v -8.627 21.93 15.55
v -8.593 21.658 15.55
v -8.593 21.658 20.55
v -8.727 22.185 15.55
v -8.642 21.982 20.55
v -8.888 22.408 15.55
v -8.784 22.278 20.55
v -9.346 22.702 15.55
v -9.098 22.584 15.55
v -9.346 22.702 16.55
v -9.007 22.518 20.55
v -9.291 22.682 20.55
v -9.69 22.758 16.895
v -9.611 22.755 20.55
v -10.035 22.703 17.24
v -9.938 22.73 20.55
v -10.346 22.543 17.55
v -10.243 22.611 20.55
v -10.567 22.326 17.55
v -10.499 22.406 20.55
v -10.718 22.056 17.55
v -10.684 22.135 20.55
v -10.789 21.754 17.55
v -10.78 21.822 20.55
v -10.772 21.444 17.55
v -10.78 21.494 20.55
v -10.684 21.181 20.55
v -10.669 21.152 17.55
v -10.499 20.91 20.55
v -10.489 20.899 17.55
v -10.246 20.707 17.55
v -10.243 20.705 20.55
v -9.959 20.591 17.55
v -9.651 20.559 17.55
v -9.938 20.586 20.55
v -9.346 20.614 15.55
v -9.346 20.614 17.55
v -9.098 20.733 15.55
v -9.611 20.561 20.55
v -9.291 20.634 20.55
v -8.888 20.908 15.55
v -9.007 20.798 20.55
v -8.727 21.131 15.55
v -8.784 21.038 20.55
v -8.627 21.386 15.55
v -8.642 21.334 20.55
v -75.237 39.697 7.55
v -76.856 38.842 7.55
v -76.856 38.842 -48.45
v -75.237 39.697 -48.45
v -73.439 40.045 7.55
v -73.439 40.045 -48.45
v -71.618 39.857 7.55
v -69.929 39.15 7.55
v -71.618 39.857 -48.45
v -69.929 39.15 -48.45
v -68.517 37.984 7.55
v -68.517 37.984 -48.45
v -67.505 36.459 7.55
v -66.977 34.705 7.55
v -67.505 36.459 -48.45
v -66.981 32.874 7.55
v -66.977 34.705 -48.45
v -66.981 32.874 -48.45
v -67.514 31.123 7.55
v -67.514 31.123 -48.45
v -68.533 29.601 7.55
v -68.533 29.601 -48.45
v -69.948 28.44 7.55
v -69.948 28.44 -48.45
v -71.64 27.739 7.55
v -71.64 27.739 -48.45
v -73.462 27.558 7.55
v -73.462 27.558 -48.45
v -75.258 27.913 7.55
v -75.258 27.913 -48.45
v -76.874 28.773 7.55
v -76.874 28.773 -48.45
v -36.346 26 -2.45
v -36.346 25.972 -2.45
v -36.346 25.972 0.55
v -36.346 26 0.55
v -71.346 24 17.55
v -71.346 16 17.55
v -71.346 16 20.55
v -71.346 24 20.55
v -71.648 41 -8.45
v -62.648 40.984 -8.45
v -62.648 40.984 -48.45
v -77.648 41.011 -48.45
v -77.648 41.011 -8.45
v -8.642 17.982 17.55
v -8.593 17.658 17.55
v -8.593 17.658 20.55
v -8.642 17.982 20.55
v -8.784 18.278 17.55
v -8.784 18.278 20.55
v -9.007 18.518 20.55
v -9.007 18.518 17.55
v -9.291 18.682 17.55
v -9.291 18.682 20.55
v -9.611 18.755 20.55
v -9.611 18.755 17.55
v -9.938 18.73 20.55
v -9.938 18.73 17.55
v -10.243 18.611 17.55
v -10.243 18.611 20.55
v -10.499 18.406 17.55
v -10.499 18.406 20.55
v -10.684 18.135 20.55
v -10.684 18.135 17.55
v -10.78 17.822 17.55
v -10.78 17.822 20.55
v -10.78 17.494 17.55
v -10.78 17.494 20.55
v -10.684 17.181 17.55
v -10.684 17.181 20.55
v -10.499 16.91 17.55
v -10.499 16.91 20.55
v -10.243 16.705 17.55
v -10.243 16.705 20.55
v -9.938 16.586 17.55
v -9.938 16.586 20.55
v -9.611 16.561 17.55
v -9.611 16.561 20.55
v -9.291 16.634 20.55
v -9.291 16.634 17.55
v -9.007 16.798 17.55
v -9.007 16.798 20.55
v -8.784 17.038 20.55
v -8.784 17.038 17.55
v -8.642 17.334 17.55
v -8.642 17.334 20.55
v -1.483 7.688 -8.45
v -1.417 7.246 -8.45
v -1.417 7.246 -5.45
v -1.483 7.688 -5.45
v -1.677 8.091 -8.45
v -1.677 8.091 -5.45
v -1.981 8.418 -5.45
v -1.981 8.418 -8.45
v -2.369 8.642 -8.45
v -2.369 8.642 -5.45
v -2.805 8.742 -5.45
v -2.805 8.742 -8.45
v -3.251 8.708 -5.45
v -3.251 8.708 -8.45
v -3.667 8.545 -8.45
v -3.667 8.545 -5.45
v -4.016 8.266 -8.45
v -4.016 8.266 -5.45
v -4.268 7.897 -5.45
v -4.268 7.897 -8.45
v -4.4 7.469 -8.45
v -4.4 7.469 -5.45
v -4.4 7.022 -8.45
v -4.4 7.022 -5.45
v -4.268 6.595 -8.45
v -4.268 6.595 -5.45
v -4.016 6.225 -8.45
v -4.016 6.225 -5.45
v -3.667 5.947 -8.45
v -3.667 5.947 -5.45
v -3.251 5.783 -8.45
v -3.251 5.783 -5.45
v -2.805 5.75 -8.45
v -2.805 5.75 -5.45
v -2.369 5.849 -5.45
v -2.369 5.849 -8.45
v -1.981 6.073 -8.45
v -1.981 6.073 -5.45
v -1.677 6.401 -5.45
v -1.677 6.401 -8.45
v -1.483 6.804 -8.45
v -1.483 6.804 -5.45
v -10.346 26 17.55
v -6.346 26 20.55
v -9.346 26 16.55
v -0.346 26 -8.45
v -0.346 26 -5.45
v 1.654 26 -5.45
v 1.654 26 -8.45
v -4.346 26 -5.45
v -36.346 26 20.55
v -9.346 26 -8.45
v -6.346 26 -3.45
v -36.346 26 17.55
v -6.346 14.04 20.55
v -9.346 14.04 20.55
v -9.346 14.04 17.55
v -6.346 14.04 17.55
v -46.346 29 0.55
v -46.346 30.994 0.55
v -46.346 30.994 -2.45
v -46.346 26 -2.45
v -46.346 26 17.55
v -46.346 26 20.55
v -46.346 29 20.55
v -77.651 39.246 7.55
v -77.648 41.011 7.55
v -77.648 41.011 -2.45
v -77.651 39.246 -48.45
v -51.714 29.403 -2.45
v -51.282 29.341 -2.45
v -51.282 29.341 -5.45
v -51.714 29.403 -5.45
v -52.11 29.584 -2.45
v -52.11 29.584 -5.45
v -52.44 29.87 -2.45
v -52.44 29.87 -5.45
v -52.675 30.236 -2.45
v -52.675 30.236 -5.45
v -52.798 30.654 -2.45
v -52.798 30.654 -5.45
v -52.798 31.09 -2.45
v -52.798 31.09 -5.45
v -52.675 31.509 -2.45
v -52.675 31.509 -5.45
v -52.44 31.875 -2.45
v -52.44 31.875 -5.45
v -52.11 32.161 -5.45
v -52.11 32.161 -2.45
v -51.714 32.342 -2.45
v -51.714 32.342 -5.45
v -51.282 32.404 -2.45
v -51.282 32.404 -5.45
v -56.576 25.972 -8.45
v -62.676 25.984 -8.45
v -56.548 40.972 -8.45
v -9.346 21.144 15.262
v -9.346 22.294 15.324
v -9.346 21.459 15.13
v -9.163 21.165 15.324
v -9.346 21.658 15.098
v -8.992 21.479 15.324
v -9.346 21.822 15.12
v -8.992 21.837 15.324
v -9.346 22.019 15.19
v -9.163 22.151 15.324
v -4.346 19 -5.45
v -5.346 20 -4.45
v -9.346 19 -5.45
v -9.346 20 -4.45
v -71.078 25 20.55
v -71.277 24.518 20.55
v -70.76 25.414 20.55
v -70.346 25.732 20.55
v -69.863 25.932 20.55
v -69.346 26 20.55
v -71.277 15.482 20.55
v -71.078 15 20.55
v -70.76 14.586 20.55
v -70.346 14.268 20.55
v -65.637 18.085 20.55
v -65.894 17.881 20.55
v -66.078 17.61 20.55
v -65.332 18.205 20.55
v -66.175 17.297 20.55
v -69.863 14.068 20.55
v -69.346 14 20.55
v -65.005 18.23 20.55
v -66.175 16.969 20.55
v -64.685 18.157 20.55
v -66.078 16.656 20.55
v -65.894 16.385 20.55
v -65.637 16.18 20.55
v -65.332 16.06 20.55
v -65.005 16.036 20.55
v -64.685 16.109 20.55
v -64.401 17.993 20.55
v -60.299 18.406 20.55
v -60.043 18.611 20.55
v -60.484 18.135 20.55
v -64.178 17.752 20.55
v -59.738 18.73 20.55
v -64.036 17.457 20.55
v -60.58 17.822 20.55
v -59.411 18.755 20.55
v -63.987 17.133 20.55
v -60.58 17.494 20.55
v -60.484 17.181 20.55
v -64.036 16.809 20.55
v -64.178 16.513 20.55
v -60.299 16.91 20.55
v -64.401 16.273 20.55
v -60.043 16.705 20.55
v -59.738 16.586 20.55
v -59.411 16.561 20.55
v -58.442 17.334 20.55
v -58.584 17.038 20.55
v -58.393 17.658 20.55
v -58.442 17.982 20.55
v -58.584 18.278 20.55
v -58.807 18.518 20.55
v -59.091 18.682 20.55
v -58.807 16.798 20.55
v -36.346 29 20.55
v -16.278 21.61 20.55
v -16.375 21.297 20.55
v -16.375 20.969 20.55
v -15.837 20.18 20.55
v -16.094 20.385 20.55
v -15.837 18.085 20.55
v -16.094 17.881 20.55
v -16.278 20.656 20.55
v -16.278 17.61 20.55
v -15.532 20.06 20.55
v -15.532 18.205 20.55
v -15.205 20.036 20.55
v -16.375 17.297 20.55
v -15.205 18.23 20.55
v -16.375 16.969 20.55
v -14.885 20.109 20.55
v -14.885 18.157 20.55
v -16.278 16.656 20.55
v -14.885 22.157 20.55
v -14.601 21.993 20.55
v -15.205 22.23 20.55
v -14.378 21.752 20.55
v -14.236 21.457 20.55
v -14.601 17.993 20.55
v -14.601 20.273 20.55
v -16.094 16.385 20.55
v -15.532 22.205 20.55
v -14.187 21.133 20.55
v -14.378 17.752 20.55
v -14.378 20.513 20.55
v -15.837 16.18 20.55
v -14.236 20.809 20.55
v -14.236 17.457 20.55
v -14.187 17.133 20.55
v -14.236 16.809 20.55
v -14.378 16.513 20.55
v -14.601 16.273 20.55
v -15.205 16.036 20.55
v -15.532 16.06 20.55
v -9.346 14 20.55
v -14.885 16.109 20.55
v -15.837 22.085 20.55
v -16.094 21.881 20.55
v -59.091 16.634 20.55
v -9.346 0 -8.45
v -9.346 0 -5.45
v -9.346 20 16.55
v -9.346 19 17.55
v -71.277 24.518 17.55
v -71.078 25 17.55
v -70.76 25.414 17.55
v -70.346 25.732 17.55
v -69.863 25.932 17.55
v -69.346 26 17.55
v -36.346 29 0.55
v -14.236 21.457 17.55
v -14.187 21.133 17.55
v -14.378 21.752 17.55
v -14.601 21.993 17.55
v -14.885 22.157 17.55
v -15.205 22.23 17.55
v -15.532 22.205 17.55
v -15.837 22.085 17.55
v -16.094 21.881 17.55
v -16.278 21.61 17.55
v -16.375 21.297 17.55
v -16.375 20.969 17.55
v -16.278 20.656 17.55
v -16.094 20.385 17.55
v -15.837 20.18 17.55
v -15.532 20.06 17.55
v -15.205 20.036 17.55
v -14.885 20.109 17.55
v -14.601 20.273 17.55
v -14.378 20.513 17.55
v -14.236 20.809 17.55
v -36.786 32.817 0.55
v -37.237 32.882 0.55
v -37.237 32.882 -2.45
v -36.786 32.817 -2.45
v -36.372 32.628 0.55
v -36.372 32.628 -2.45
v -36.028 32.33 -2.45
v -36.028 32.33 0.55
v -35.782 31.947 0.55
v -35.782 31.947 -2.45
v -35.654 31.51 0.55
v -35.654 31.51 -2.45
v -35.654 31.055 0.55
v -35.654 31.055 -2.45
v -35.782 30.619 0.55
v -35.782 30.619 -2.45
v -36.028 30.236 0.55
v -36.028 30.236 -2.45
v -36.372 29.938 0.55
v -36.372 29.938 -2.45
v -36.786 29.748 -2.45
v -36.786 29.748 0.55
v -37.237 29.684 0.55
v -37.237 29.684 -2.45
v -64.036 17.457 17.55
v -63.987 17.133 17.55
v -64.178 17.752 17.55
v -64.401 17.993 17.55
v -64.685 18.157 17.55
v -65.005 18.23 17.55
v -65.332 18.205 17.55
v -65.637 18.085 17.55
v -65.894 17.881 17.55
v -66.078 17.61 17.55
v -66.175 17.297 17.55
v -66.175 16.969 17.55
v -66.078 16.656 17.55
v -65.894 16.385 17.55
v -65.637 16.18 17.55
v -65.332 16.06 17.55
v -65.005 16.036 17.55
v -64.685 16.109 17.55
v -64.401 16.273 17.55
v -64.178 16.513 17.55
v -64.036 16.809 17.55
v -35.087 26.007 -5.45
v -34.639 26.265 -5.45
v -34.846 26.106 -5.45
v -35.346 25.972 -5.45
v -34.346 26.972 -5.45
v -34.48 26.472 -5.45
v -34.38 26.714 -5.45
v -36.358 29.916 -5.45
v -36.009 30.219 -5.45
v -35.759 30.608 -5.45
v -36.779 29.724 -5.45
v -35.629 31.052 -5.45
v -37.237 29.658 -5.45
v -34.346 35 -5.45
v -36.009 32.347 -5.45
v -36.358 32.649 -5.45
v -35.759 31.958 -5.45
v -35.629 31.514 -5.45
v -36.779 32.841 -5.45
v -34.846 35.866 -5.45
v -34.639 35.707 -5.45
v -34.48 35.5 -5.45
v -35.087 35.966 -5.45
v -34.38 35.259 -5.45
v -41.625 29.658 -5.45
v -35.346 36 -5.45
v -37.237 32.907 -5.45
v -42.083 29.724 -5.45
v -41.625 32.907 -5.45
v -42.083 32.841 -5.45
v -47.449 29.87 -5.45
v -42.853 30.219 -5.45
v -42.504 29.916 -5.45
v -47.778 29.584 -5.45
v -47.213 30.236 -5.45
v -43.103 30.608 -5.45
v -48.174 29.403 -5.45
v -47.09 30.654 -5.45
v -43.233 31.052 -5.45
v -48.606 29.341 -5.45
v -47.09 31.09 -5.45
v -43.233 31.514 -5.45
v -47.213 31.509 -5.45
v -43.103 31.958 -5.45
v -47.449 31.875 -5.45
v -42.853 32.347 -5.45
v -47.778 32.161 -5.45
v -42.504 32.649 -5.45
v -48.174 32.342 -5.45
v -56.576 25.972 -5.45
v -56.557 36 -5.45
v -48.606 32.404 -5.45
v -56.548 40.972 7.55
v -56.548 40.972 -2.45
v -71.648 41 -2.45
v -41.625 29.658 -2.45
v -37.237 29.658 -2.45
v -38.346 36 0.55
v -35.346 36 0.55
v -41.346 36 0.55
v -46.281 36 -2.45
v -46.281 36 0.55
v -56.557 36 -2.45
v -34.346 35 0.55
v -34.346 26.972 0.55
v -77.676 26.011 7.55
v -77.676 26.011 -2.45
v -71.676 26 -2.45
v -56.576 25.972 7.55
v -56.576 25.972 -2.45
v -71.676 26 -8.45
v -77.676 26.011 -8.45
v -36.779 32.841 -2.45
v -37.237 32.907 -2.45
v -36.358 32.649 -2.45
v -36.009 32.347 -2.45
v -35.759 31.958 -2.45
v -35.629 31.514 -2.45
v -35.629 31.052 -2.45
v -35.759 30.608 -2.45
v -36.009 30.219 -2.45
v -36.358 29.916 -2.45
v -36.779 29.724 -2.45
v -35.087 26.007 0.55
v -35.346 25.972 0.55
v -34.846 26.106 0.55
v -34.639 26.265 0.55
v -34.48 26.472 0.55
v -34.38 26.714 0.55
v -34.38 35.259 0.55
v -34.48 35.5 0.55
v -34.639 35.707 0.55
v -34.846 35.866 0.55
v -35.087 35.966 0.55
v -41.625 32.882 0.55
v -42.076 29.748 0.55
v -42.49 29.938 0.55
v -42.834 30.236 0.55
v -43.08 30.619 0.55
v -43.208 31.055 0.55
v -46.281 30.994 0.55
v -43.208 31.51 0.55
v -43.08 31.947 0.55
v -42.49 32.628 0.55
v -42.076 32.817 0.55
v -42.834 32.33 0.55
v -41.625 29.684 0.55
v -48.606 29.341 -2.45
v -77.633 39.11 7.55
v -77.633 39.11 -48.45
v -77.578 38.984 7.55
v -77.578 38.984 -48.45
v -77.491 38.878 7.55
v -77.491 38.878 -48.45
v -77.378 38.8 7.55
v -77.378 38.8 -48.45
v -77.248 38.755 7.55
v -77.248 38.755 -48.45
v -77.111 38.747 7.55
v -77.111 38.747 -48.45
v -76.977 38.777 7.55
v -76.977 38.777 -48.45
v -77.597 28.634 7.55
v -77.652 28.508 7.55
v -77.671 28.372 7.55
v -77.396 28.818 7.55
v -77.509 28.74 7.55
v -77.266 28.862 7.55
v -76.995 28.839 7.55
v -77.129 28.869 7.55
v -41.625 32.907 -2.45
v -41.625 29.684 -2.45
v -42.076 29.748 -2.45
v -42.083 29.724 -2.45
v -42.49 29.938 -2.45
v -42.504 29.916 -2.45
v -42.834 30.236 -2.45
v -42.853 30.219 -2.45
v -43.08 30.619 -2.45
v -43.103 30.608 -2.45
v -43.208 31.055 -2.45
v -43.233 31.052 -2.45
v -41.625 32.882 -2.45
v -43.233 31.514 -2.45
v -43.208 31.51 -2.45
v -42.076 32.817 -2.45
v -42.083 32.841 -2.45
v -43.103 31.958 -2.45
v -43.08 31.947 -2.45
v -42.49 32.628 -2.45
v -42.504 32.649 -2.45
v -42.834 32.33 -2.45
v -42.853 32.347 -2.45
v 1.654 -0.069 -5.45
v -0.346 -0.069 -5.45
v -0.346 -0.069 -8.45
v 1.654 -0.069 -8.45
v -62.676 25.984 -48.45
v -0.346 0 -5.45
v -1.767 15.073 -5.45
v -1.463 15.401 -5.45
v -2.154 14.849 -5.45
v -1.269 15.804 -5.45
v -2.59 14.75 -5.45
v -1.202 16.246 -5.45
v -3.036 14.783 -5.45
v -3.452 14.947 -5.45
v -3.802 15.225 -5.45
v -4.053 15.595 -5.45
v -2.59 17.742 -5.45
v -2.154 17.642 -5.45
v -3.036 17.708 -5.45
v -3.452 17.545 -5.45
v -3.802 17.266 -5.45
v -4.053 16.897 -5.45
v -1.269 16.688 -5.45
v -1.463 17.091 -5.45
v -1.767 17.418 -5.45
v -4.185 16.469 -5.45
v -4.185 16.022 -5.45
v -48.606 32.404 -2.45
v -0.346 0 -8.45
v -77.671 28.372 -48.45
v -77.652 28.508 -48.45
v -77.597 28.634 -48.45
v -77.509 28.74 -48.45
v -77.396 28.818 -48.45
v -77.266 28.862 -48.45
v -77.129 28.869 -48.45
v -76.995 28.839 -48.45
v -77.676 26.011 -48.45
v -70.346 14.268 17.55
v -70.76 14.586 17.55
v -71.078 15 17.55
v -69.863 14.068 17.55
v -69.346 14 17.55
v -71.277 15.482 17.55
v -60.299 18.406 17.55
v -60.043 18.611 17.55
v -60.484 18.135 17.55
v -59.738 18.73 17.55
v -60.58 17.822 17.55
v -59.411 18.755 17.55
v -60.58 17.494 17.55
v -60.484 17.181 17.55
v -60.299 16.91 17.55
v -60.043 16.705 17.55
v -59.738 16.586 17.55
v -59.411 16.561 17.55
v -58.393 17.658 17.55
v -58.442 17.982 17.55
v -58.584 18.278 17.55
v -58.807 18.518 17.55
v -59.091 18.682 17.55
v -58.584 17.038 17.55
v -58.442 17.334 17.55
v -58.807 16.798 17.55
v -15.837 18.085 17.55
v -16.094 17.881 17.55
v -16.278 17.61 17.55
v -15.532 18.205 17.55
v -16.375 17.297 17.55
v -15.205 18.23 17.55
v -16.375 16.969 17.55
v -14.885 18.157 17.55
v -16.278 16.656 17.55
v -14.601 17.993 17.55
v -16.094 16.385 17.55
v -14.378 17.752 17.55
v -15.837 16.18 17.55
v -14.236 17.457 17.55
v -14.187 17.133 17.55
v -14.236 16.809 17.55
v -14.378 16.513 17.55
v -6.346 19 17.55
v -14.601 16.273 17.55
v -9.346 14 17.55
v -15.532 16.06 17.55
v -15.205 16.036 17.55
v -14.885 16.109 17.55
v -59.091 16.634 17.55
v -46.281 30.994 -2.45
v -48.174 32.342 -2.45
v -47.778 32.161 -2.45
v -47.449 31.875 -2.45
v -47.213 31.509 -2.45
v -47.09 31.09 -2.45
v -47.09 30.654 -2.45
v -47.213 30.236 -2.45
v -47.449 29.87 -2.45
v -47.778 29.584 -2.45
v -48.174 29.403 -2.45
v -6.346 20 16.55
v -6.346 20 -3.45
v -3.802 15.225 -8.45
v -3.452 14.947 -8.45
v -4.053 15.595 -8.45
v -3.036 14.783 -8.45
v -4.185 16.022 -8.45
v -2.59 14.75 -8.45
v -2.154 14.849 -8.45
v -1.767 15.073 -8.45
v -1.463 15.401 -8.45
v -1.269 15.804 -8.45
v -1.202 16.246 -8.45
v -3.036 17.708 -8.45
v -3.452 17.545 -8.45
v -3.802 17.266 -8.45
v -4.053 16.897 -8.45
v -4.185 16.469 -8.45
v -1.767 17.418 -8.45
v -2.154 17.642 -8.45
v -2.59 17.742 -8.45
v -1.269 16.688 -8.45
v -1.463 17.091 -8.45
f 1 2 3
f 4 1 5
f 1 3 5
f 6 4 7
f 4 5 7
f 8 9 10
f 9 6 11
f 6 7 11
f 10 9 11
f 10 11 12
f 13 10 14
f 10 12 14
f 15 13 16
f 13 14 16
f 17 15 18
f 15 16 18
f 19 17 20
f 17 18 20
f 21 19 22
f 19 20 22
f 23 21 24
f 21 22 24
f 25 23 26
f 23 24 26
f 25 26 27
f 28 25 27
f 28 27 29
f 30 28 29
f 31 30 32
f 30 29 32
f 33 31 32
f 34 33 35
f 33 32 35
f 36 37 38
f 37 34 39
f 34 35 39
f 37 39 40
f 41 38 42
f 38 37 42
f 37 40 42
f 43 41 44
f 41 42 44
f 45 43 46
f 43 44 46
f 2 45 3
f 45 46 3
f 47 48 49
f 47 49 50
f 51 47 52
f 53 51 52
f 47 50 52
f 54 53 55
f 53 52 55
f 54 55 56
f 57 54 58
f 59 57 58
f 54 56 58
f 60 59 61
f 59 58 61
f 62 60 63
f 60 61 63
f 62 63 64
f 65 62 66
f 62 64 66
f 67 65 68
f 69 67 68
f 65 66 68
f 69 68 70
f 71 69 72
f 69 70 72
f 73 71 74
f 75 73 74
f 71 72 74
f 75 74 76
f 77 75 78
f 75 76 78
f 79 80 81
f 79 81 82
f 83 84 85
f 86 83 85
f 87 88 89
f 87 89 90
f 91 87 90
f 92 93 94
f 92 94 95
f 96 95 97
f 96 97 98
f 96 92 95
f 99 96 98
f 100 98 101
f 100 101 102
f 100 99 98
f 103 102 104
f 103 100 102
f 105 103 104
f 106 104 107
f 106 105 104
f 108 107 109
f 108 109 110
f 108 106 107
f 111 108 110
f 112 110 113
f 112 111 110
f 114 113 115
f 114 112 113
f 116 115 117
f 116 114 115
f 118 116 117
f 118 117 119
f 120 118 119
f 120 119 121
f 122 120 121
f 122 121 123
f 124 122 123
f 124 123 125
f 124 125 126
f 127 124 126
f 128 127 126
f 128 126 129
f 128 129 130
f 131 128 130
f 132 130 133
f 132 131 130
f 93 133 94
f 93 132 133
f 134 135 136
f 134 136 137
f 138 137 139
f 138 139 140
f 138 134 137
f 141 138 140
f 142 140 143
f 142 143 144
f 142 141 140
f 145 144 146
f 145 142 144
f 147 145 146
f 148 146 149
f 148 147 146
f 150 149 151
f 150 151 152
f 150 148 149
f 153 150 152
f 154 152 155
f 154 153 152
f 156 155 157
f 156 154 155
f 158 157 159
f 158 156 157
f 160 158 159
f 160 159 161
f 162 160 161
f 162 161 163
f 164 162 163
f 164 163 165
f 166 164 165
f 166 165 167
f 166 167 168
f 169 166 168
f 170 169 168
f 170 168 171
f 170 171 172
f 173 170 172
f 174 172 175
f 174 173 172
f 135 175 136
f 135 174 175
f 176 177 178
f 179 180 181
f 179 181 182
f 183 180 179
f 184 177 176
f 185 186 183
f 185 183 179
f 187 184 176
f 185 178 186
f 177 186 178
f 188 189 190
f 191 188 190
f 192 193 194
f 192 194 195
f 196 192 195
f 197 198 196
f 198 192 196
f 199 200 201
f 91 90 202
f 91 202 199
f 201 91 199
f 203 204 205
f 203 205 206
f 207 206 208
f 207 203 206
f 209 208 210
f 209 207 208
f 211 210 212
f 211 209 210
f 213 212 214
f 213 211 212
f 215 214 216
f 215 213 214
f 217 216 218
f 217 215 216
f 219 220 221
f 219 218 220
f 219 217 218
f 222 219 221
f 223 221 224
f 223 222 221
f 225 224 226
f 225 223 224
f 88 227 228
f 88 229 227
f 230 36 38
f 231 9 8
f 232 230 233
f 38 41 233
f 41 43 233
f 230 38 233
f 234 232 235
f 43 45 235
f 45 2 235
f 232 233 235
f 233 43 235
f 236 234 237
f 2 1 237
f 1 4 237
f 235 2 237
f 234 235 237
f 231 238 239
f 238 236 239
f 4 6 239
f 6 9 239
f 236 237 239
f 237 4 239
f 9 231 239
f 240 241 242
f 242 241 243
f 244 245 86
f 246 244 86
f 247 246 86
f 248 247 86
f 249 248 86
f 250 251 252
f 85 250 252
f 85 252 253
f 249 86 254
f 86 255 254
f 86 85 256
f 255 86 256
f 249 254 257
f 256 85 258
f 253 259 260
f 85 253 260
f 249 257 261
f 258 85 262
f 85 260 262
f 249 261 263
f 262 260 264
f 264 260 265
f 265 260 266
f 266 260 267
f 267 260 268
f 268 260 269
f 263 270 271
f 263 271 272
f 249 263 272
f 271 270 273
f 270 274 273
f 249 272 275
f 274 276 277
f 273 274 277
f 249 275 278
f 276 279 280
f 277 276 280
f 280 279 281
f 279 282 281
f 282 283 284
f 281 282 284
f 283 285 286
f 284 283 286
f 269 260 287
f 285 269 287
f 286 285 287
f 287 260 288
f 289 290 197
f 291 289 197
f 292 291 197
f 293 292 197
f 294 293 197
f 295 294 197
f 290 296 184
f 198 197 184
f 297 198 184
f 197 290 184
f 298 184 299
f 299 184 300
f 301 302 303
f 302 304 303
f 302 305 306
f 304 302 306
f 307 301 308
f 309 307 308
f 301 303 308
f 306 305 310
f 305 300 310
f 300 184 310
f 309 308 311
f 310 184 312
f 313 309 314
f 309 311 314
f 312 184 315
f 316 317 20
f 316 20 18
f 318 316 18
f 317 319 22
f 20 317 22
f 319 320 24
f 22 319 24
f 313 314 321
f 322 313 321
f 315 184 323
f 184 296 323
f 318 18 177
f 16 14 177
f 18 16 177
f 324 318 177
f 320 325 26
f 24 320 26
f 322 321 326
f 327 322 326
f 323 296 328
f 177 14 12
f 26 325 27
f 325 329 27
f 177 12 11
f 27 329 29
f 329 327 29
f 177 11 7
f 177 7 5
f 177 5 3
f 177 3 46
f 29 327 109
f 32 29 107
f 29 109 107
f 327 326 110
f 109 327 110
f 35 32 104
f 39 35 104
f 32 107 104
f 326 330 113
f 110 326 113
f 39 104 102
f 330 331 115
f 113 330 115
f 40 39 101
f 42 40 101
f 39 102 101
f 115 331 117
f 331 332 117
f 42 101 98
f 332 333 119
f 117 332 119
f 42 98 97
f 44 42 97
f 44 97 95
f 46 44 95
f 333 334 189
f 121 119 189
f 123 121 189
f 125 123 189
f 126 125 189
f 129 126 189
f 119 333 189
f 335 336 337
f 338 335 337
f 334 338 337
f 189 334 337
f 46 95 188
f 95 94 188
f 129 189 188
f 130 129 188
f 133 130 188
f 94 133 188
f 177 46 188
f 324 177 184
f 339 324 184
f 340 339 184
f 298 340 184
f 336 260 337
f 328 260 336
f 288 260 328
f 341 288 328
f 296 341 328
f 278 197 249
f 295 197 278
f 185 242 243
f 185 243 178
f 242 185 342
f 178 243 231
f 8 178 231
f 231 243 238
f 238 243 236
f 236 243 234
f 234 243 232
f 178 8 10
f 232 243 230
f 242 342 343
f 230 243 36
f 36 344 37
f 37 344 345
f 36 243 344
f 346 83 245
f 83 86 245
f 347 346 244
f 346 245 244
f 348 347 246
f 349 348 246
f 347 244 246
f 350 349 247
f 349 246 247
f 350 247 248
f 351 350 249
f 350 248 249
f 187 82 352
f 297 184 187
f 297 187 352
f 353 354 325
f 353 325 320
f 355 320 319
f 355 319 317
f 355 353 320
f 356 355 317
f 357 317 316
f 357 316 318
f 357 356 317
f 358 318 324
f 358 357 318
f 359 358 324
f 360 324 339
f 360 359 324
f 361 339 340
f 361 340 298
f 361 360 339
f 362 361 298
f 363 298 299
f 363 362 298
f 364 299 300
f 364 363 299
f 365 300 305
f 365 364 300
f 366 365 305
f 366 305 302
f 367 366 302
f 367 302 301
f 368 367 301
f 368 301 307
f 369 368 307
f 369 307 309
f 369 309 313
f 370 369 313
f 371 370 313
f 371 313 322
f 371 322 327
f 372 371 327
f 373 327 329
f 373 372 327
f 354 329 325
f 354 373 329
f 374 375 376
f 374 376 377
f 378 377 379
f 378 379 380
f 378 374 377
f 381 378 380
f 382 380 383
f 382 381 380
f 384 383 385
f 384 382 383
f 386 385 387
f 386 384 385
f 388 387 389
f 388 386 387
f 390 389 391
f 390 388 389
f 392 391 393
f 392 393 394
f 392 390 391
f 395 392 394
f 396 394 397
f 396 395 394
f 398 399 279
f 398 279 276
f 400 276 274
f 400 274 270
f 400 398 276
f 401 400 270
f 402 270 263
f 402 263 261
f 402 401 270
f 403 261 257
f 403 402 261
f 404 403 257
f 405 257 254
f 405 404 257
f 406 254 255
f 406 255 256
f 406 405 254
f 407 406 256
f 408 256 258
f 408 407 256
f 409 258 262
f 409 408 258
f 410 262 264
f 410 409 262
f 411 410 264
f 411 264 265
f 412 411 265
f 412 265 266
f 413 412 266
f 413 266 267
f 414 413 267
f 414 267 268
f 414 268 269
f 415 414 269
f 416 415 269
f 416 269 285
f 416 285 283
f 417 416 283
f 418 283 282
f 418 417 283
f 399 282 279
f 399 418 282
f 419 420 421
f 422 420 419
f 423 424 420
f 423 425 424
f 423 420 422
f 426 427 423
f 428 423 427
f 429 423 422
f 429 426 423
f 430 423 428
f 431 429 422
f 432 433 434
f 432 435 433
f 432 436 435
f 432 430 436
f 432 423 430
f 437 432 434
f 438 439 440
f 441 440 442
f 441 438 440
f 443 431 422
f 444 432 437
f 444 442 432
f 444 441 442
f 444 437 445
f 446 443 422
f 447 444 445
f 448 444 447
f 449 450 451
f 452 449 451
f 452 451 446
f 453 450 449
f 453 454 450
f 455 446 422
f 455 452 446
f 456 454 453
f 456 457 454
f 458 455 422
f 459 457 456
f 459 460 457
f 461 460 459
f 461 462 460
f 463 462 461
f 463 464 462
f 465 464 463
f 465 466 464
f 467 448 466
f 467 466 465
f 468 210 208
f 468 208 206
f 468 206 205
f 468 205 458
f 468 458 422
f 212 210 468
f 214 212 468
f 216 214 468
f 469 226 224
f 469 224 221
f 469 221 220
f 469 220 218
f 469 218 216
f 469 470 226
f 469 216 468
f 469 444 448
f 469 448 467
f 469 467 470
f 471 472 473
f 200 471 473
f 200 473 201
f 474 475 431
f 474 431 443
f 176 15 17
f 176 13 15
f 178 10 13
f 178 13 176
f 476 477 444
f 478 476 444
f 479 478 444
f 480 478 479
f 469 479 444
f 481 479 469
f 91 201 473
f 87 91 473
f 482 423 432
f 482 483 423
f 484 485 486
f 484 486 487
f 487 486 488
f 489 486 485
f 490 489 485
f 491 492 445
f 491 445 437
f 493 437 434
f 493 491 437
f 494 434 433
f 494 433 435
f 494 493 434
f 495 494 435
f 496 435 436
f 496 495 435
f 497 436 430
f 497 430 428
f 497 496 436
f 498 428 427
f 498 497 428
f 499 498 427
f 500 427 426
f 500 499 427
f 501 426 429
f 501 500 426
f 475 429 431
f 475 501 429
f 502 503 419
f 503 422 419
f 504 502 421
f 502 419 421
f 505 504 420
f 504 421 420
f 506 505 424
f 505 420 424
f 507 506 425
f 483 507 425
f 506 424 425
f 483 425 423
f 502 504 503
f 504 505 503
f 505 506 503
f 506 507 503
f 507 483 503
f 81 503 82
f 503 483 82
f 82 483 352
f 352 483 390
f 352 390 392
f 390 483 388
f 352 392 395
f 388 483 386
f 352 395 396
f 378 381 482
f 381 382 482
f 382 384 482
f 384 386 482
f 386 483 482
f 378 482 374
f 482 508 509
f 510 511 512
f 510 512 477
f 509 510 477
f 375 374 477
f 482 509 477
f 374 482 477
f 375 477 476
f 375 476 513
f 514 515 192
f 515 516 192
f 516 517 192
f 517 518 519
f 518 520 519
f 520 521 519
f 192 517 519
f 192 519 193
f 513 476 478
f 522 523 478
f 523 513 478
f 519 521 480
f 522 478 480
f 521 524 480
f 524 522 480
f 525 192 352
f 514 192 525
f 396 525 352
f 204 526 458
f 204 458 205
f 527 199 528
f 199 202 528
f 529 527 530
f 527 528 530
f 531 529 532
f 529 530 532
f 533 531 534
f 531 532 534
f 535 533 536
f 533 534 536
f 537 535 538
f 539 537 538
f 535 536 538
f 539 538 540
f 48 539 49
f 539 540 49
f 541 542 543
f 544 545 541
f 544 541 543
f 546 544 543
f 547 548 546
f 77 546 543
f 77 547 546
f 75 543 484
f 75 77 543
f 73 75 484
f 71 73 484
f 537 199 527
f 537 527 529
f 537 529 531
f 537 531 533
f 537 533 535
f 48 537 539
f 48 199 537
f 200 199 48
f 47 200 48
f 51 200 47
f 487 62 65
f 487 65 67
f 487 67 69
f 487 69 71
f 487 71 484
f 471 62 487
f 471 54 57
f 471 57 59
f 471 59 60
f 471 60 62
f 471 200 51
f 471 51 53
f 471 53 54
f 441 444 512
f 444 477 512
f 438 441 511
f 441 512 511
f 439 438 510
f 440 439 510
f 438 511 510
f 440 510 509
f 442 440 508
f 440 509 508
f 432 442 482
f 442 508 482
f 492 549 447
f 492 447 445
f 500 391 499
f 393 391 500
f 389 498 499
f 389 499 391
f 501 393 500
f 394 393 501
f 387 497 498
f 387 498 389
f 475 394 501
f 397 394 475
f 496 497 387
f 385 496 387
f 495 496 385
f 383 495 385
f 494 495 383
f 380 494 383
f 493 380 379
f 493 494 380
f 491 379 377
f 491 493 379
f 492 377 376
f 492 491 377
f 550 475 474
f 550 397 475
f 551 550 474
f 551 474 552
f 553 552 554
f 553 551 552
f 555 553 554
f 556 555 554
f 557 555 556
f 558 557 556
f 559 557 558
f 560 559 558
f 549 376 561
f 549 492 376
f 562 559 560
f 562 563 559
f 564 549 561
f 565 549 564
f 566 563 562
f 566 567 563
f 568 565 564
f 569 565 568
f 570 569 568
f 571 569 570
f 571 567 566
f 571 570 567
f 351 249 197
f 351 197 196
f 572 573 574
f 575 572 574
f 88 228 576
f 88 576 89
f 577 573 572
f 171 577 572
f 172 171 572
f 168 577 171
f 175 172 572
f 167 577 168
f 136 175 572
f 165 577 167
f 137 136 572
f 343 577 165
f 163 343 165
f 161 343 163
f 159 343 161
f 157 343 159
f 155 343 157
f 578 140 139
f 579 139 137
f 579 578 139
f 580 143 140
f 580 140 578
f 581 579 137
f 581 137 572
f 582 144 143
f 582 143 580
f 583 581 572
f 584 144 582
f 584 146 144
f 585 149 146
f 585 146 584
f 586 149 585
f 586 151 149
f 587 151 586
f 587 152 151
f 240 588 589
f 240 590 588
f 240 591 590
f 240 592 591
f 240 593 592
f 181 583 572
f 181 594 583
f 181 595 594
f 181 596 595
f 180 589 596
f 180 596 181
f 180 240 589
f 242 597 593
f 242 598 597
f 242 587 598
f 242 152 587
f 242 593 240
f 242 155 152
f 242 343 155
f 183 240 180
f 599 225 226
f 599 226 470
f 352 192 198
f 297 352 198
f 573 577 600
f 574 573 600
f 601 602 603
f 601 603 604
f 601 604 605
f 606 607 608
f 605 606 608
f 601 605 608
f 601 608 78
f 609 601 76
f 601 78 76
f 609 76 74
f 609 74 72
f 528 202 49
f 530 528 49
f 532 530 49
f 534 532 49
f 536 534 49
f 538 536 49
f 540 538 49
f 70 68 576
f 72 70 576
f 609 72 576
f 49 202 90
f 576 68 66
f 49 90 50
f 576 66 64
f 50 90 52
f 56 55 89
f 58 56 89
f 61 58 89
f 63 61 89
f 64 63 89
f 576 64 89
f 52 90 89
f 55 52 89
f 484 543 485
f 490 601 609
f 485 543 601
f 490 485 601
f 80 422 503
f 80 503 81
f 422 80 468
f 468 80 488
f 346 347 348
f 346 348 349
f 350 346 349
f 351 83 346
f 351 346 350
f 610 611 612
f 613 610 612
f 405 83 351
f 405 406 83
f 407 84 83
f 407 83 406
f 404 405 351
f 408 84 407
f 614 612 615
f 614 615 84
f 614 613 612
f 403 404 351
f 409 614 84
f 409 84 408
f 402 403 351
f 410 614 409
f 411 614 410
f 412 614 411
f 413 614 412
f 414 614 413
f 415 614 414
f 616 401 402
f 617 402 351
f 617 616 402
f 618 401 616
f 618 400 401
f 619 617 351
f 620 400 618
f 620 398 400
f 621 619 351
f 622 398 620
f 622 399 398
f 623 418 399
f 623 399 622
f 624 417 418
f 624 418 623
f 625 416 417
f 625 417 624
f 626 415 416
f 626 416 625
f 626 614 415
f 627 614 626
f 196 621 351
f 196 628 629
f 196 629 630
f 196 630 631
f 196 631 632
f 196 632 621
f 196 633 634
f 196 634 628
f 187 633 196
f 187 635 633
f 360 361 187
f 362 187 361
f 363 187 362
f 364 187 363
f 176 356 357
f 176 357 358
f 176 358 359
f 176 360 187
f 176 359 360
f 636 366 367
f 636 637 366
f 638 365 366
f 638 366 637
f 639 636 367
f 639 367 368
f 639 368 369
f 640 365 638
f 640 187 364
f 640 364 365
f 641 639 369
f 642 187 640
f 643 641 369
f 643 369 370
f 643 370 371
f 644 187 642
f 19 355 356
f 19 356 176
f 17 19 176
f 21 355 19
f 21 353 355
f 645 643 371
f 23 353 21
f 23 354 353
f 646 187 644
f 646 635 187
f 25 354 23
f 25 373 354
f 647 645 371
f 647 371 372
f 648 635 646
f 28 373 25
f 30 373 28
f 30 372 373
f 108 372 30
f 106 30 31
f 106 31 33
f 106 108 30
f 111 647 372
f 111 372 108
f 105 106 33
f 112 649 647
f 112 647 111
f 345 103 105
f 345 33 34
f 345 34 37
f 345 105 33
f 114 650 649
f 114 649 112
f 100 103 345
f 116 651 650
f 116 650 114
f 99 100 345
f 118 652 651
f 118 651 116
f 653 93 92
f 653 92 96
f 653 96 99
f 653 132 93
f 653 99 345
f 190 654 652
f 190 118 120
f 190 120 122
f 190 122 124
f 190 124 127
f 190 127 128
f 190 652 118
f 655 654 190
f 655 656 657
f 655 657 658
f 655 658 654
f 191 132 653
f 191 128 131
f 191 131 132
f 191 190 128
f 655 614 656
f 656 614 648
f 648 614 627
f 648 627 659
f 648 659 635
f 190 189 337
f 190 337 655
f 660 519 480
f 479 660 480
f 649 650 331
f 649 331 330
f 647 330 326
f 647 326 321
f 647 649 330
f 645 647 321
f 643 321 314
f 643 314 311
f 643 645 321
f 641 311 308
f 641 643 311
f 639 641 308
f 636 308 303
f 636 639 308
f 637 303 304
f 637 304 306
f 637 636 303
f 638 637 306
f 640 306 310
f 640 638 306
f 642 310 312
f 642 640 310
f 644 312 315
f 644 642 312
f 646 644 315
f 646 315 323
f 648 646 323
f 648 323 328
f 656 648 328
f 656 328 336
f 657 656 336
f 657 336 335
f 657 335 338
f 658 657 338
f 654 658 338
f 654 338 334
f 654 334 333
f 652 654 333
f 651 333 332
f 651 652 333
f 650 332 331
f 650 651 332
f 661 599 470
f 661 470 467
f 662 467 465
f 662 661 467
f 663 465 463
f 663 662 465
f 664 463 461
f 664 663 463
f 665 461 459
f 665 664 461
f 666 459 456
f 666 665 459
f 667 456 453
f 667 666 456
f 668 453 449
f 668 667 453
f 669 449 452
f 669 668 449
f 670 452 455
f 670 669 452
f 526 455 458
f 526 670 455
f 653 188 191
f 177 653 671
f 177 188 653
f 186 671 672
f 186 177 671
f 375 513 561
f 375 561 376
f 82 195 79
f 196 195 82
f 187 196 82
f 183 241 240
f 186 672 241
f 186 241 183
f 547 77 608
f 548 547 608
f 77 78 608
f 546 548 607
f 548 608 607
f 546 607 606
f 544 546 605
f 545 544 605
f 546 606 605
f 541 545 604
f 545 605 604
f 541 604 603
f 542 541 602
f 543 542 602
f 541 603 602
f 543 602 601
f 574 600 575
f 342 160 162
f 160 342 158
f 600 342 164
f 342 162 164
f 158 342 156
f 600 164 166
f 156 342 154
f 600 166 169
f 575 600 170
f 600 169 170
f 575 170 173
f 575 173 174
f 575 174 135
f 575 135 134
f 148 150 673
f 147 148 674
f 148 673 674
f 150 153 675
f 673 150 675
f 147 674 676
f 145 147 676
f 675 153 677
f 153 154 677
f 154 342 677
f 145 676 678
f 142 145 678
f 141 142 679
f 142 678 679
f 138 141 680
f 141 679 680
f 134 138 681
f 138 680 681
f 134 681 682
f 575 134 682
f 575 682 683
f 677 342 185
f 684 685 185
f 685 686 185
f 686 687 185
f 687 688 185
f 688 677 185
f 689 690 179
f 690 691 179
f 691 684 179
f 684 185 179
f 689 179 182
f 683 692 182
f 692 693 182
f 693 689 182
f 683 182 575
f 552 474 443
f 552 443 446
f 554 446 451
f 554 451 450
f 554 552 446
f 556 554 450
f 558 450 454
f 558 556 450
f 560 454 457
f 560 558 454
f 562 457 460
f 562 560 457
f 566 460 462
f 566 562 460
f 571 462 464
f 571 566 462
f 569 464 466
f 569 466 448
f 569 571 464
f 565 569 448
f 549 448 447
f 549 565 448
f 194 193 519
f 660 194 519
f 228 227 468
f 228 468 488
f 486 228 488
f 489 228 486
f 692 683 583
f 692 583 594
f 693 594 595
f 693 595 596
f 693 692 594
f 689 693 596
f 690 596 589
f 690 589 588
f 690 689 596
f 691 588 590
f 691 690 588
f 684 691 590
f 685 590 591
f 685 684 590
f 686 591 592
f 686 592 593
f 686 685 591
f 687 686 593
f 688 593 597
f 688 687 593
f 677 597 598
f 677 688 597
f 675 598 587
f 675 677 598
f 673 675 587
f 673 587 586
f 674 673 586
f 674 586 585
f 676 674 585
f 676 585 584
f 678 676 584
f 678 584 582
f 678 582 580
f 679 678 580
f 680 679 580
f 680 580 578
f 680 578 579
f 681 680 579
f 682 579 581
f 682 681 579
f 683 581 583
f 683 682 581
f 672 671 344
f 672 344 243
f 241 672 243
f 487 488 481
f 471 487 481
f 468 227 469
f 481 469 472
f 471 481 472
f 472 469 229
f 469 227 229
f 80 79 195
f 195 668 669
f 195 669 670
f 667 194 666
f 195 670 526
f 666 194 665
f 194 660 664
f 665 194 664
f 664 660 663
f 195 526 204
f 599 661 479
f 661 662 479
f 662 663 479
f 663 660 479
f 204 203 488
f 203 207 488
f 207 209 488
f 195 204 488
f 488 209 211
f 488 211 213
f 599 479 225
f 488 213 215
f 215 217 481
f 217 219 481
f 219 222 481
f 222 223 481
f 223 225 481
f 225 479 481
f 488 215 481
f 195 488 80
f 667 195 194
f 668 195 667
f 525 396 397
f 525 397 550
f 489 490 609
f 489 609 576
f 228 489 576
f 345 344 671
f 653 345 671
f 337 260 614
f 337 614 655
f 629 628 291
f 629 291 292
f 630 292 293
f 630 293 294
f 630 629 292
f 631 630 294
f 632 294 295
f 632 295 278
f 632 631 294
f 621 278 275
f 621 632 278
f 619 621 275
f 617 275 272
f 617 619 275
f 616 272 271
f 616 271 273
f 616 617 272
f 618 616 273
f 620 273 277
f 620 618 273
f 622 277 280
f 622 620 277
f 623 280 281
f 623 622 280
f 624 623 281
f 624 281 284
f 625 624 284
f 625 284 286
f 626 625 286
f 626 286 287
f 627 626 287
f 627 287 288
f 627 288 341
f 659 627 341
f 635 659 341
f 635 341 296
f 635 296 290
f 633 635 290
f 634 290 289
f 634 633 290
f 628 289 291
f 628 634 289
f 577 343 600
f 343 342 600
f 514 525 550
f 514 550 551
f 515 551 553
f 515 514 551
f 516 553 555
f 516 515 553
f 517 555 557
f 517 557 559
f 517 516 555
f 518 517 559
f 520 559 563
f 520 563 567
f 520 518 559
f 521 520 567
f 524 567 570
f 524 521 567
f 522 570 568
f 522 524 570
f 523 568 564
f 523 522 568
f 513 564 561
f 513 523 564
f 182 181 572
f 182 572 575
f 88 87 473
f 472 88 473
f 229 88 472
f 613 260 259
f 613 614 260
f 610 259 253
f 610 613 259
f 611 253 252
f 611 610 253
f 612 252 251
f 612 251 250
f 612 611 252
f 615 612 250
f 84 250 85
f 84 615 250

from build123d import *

# Parameters (mm, degrees)
EXTRUDE_1_DEPTH                 = 26
HOLE_START                      = -8.449868074
HOLE_WIZARD_3_0_3_1_OUTLINE_R   = 1.5
HOLE_WIZARD_3_0_3_1_DEPTH       = 3
SKETCH_11_W                     = 26
SKETCH_11_H                     = 20
CUT_EXTRUDE_1_DEPTH             = 3
SKETCH_14_W                     = 62
SKETCH_14_H                     = 14
CUT_EXTRUDE_2_DEPTH             = 3
SKETCH_18_W                     = 3
SKETCH_18_H                     = 5.960488001
EXTRUDE_5_DEPTH                 = 3
HOLE_START_2                    = 17.550131926
HOLE_WIZARD_3_0_2_2_1_OUTLINE_R = 1.1
HOLE_WIZARD_3_0_2_2_1_DEPTH     = 3
HOLE_WIZARD_3_0_2_2_2_OUTLINE_R = 1.1
HOLE_WIZARD_3_0_2_2_2_DEPTH     = 3
HOLE_WIZARD_3_0_2_2_3_OUTLINE_R = 1.1
HOLE_WIZARD_3_0_2_2_3_DEPTH     = 3
HOLE_WIZARD_3_0_2_2_4_OUTLINE_R = 1.1
HOLE_WIZARD_3_0_2_2_4_DEPTH     = 3
CHAMFER_1_SIZE                  = 1
CHAMFER_2_SIZE                  = 2
CHAMFER_3_SIZE                  = 1
SKETCH_45_W                     = 3
SKETCH_45_H                     = 26.068743285
EXTRUDE_6_DEPTH                 = 2
CHAMFER_4_SIZE                  = 1
SKETCH_64_W                     = 5
SKETCH_64_H                     = 3
EXTRUDE_11_DEPTH                = 5
SKETCH_65_W                     = 5
SKETCH_65_H                     = 4.928929729
EXTRUDE_12_DEPTH                = 20
SKETCH_68_W                     = 5
SKETCH_68_H                     = 3
EXTRUDE_13_DEPTH                = 5
SKETCH_70_W                     = 3
SKETCH_70_H                     = 5.006023724
EXTRUDE_14_DEPTH                = 4
SKETCH_71_W                     = 3
SKETCH_71_H                     = 4.998374441
EXTRUDE_15_DEPTH                = 3
SKETCH_73_W                     = 20
SKETCH_73_H                     = 2.154918848
CUT_EXTRUDE_5_DEPTH             = 5
FILLET_1_R                      = 2
EXTRUDE_START                   = -3
SKETCH_80_R                     = 1.5
EXTRUDE_16_DEPTH                = 3
HOLE_WIZARD_3_0_3_2_OUTLINE_R   = 1.5
HOLE_WIZARD_3_0_3_2_DEPTH       = 3
SKETCH_88_W                     = 5
SKETCH_88_H                     = 3
EXTRUDE_20_DEPTH                = 5
SKETCH_89_W                     = 5
SKETCH_89_H                     = 2.54765363
EXTRUDE_21_DEPTH                = 20
SKETCH_92_W                     = 2.009733892
SKETCH_92_H                     = 3
EXTRUDE_22_DEPTH                = 5
SKETCH_93_W                     = 4.064903442
SKETCH_93_H                     = 5.006023724
CUT_EXTRUDE_6_DEPTH             = 5
SKETCH_94_W                     = 3
SKETCH_94_H                     = 7.492263756
EXTRUDE_23_DEPTH                = 2
EXTRUDE_24_DEPTH                = 20
SKETCH_101_W                    = 2
SKETCH_101_H                    = 2.53530172
EXTRUDE_25_DEPTH                = 3
SKETCH_102_W                    = 20
SKETCH_102_H                    = 2
CUT_EXTRUDE_8_DEPTH             = 10
CUT_EXTRUDE_9_DEPTH             = 3
SKETCH_112_W                    = 22.23
SKETCH_112_H                    = 10.027565476
EXTRUDE_26_DEPTH                = 3
CUT_EXTRUDE_10_DEPTH            = 3
HOLE_WIZARD_3_0_3_3_D           = 3
HOLE_WIZARD_3_0_3_3_DEPTH       = 5
HOLE_WIZARD_3_0_3_3_TIP         = 0.901290929
EXTRUDE_27_DEPTH                = 3
FILLET_2_R                      = 1
CUT_EXTRUDE_13_DEPTH            = 6
EXTRUDE_28_DEPTH                = 6
EXTRUDE_29_DEPTH                = 40
EXTRUDE_30_DEPTH                = 10
SKETCH_126_R                    = 6.25
CUT_EXTRUDE_14_DEPTH            = 56
FILLET_3_R                      = 0.5
FILLET_4_R                      = 0.5


# Read off the part's stored shape, not the designer's step: Ø3.0 (3) 直径孔1, Ø3.0 (2.2) 直径孔1, Ø3.0 (2.2) 直径孔2, Ø3.0 (2.2) 直径孔3, Ø3.0 (2.2) 直径孔4, Ø3.0 (3) 直径孔2
with BuildPart() as part:
    # 草图4 → 凸台-拉伸1 (new body)
    with BuildSketch(Plane(origin=(0, 0, 0), x_dir=(1, 0, 0), z_dir=(0, 1, 0))):
        Polygon((-71.345646438, -20.550131926), (-6.345646438, -20.550131926), (-6.345646438, 5.449868074), (-0.345646438, 5.449868074), (-0.345646438, 8.449868074), (-9.345646438, 8.449868074), (-9.345646438, -17.550131926), (-71.345646438, -17.550131926), align=None)
    extrude(amount=EXTRUDE_1_DEPTH)

    # Ø3.0 (3) 直径孔1 outline → Ø3.0 (3) 直径孔1 (cut)
    with BuildSketch(Plane.XY.offset(HOLE_START)):
        with Locations((-2.70204226, 8.045696334)):
            Circle(HOLE_WIZARD_3_0_3_1_OUTLINE_R)
        with Locations((-2.70204226, 16.245696334)):
            Circle(HOLE_WIZARD_3_0_3_1_OUTLINE_R)
    extrude(amount=HOLE_WIZARD_3_0_3_1_DEPTH, mode=Mode.SUBTRACT)

    # 草图11 → 切除-拉伸1 (cut)
    with BuildSketch(Plane(origin=(-6.345646438, 0, 0), x_dir=(0, 0, -1), z_dir=(1, 0, 0))):
        with Locations((-7.550131926, 10)):
            Rectangle(SKETCH_11_W, SKETCH_11_H)
    extrude(amount=-CUT_EXTRUDE_1_DEPTH, mode=Mode.SUBTRACT)

    # 草图14 → 切除-拉伸2 (cut)
    with BuildSketch(Plane.XY.offset(20.550131926)):
        with Locations((-40.345646438, 7)):
            Rectangle(SKETCH_14_W, SKETCH_14_H)
    extrude(amount=-CUT_EXTRUDE_2_DEPTH, mode=Mode.SUBTRACT)

    # 草图18 → 凸台-拉伸5 (add)
    with BuildSketch(Plane(origin=(-9.345646438, 0, 0), x_dir=(0, 0, -1), z_dir=(1, 0, 0))):
        with Locations((-19.050131926, 17.019755999)):
            Rectangle(SKETCH_18_W, SKETCH_18_H)
    extrude(amount=EXTRUDE_5_DEPTH)

    # Ø3.0 (2.2) 直径孔1 outline → Ø3.0 (2.2) 直径孔1 (cut)
    with BuildSketch(Plane.XY.offset(HOLE_START_2)):
        with Locations((-9.692746544, 17.658013179)):
            Circle(HOLE_WIZARD_3_0_2_2_1_OUTLINE_R)
    extrude(amount=HOLE_WIZARD_3_0_2_2_1_DEPTH, mode=Mode.SUBTRACT)

    # Hole Wizard 3.0 _2.2_ _1 2 outline → Hole Wizard 3.0 _2.2_ _1 2 (revolve, cut)
    with BuildSketch(Plane(origin=(-9.692746544, 21.658013179, 0), x_dir=(1, 0, 0), z_dir=(0, -1, 0))):
        Polygon((0.346891917, 15.097618937), (1.100000001, 15.550131926), (1.1, 20.550131926), (0, 20.550131926), (0, 15.097618937), align=None)
    revolve(axis=Axis((-9.692746544, 21.658013179, 0), (0, 0, 1)), mode=Mode.SUBTRACT)

    # Ø3.0 (2.2) 直径孔2 outline → Ø3.0 (2.2) 直径孔2 (cut)
    with BuildSketch(Plane.XY.offset(HOLE_START_2)):
        with Locations((-59.492746544, 17.658013179)):
            Circle(HOLE_WIZARD_3_0_2_2_2_OUTLINE_R)
    extrude(amount=HOLE_WIZARD_3_0_2_2_2_DEPTH, mode=Mode.SUBTRACT)

    # Ø3.0 (2.2) 直径孔3 outline → Ø3.0 (2.2) 直径孔3 (cut)
    with BuildSketch(Plane.XY.offset(HOLE_START_2)):
        with Locations((-15.287259423, 17.132806202)):
            Circle(HOLE_WIZARD_3_0_2_2_3_OUTLINE_R)
        with Locations((-15.287259423, 21.132806202)):
            Circle(HOLE_WIZARD_3_0_2_2_3_OUTLINE_R)
    extrude(amount=HOLE_WIZARD_3_0_2_2_3_DEPTH, mode=Mode.SUBTRACT)

    # Ø3.0 (2.2) 直径孔4 outline → Ø3.0 (2.2) 直径孔4 (cut)
    with BuildSketch(Plane.XY.offset(HOLE_START_2)):
        with Locations((-65.087259423, 17.132806202)):
            Circle(HOLE_WIZARD_3_0_2_2_4_OUTLINE_R)
    extrude(amount=HOLE_WIZARD_3_0_2_2_4_DEPTH, mode=Mode.SUBTRACT)

    # 倒角1
    chamfer_1_edges = [part.edges().sort_by_distance(p)[0] for p in [
        (-9.345646438, 24.350907327, 17.550131926),
    ]]
    chamfer(chamfer_1_edges, length=CHAMFER_1_SIZE)

    # 倒角2
    chamfer_2_edges = [part.edges().sort_by_distance(p)[0] for p in [
        (-6.345646438, 23, -5.449868074),
    ]]
    chamfer(chamfer_2_edges, length=CHAMFER_2_SIZE)

    # 倒角3
    chamfer_3_edges = [part.edges().sort_by_distance(p)[0] for p in [
        (-7.845646438, 20, 17.550131926),
    ]]
    chamfer(chamfer_3_edges, length=CHAMFER_3_SIZE)

    # 草图45 → 凸台-拉伸6 (add)
    with BuildSketch(Plane(origin=(-0.345646438, 0, 0), x_dir=(0, 0, -1), z_dir=(1, 0, 0))):
        with Locations((6.949868074, 12.965628357)):
            Rectangle(SKETCH_45_W, SKETCH_45_H)
    extrude(amount=EXTRUDE_6_DEPTH)

    # 倒角4
    chamfer_4_edges = [part.edges().sort_by_distance(p)[0] for p in [
        (-6.845646438, 20, -5.449868074),
    ]]
    chamfer(chamfer_4_edges, length=CHAMFER_4_SIZE)

    # 草图64 → 凸台-拉伸11 (add)
    with BuildSketch(Plane(origin=(0, 26, 0), x_dir=(1, 0, 0), z_dir=(0, 1, 0))):
        with Locations((-43.845646438, -19.050131926)):
            Rectangle(SKETCH_64_W, SKETCH_64_H)
    extrude(amount=EXTRUDE_11_DEPTH)

    # 草图65 → 凸台-拉伸12 (add)
    with BuildSketch(Plane(origin=(0, 0, 17.550131926), x_dir=(-1, 0, 0), z_dir=(0, 0, -1))):
        with Locations((43.845646438, 28.535535136)):
            Rectangle(SKETCH_65_W, SKETCH_65_H)
    extrude(amount=EXTRUDE_12_DEPTH)

    # 草图68 → 凸台-拉伸13 (add)
    with BuildSketch(Plane(origin=(0, 31, 0), x_dir=(1, 0, 0), z_dir=(0, 1, 0))):
        with Locations((-43.845646438, 0.949868074)):
            Rectangle(SKETCH_68_W, SKETCH_68_H)
    extrude(amount=EXTRUDE_13_DEPTH)

    # 草图70 → 凸台-拉伸14 (add)
    with BuildSketch(Plane.ZY.offset(46.345646438)):
        with Locations((-0.949868074, 33.496988138)):
            Rectangle(SKETCH_70_W, SKETCH_70_H)
    extrude(amount=EXTRUDE_14_DEPTH)

    # 草图71 → 凸台-拉伸15 (add)
    with BuildSketch(Plane(origin=(-41.345646438, 0, 0), x_dir=(0, 0, -1), z_dir=(1, 0, 0))):
        with Locations((0.949868074, 33.50081278)):
            Rectangle(SKETCH_71_W, SKETCH_71_H)
    extrude(amount=EXTRUDE_15_DEPTH)

    # 草图73 → 切除-拉伸5 (cut)
    with BuildSketch(Plane.ZY.offset(46.345646438)):
        with Locations((7.550131926, 27.148529695)):
            Rectangle(SKETCH_73_W, SKETCH_73_H)
    extrude(amount=-CUT_EXTRUDE_5_DEPTH, mode=Mode.SUBTRACT)

    # 圆角1
    fillet_1_edges = [part.edges().sort_by_distance(p)[0] for p in [
        (-71.345646438, 26, 19.050131926),
        (-71.345646438, 14, 19.050131926),
    ]]
    fillet(fillet_1_edges, radius=FILLET_1_R)

    # 草图80 → 凸台-拉伸16 (add)
    with BuildSketch(Plane.XY.offset(-5.449868074).offset(EXTRUDE_START)):
        with Locations((-2.70204226, 8.045696334)):
            Circle(SKETCH_80_R)
    extrude(amount=EXTRUDE_16_DEPTH)

    # Ø3.0 (3) 直径孔2 outline → Ø3.0 (3) 直径孔2 (cut)
    with BuildSketch(Plane.XY.offset(HOLE_START)):
        with Locations((-2.916721347, 7.245696334)):
            Circle(HOLE_WIZARD_3_0_3_2_OUTLINE_R)
    extrude(amount=HOLE_WIZARD_3_0_3_2_DEPTH, mode=Mode.SUBTRACT)

    # 草图88 → 凸台-拉伸20 (add)
    with BuildSketch(Plane(origin=(0, 26, 0), x_dir=(1, 0, 0), z_dir=(0, 1, 0))):
        with Locations((-38.845646438, -19.050131926)):
            Rectangle(SKETCH_88_W, SKETCH_88_H)
    extrude(amount=EXTRUDE_20_DEPTH)

    # 草图89 → 凸台-拉伸21 (add)
    with BuildSketch(Plane(origin=(0, 0, 17.550131926), x_dir=(-1, 0, 0), z_dir=(0, 0, -1))):
        with Locations((38.845646438, 29.726173185)):
            Rectangle(SKETCH_89_W, SKETCH_89_H)
    extrude(amount=EXTRUDE_21_DEPTH)

    # 草图92 → 凸台-拉伸22 (add)
    with BuildSketch(Plane(origin=(0, 31, 0), x_dir=(1, 0, 0), z_dir=(0, 1, 0))):
        with Locations((-37.350513384, 0.949868074)):
            Rectangle(SKETCH_92_W, SKETCH_92_H)
    extrude(amount=EXTRUDE_22_DEPTH)

    # 草图93 → 切除-拉伸6 (cut)
    with BuildSketch(Plane.XY.offset(0.550131926)):
        with Locations((-48.313194717, 33.496988138)):
            Rectangle(SKETCH_93_W, SKETCH_93_H)
    extrude(amount=-CUT_EXTRUDE_6_DEPTH, mode=Mode.SUBTRACT)

    # 草图94 → 凸台-拉伸23 (add)
    with BuildSketch(Plane(origin=(-36.345646438, 0, 0), x_dir=(0, 0, -1), z_dir=(1, 0, 0))):
        with Locations((0.949868074, 32.253868122)):
            Rectangle(SKETCH_94_W, SKETCH_94_H)
    extrude(amount=EXTRUDE_23_DEPTH)

    # 草图100 → 凸台-拉伸24 (add)
    with BuildSketch(Plane(origin=(0, 0, 17.550131926), x_dir=(-1, 0, 0), z_dir=(0, 0, -1))):
        Polygon((36.345646438, 28.45234637), (41.345646438, 28.45234637), (41.345646438, 28.225989119), (46.345646438, 28.225989119), (46.345646438, 26), (36.345646438, 26), align=None)
    extrude(amount=EXTRUDE_24_DEPTH)

    # 草图101 → 凸台-拉伸25 (add)
    with BuildSketch(Plane(origin=(0, 0, -2.449868074), x_dir=(-1, 0, 0), z_dir=(0, 0, -1))):
        with Locations((35.345646438, 27.240085384)):
            Rectangle(SKETCH_101_W, SKETCH_101_H)
    extrude(amount=-EXTRUDE_25_DEPTH)

    # 草图102 → 切除-拉伸8 (cut)
    with BuildSketch(Plane.ZY.offset(46.345646438)):
        with Locations((10.550131926, 30)):
            Rectangle(SKETCH_102_W, SKETCH_102_H)
    extrude(amount=-CUT_EXTRUDE_8_DEPTH, mode=Mode.SUBTRACT)

    # 草图109 → 切除-拉伸9 (cut)
    with BuildSketch(Plane.XY.offset(0.550131926)):
        with BuildLine():
            Line((-37.236525371, 29.683707729), (-41.625380126, 29.683707729))
            ThreePointArc((-41.625380126, 29.683707729), (-43.224486744, 31.282814348), (-41.625380126, 32.881920967))
            Line((-41.625380126, 32.881920967), (-37.236525371, 32.881920967))
            ThreePointArc((-37.236525371, 32.881920967), (-35.637418752, 31.282814348), (-37.236525371, 29.683707729))
        make_face()
    extrude(amount=-CUT_EXTRUDE_9_DEPTH, mode=Mode.SUBTRACT)

    # 草图112 → 凸台-拉伸26 (add)
    with BuildSketch(Plane(origin=(0, 0, -2.449868074), x_dir=(-1, 0, 0), z_dir=(0, 0, -1))):
        with Locations((45.460646438, 30.986217262)):
            Rectangle(SKETCH_112_W, SKETCH_112_H)
    extrude(amount=EXTRUDE_26_DEPTH)

    # 草图113 → 切除-拉伸10 (cut)
    with BuildSketch(Plane.XY.offset(-2.449868074)):
        with BuildLine():
            Line((-37.236525371, 29.658436642), (-41.625380126, 29.658436642))
            ThreePointArc((-41.625380126, 29.658436642), (-43.249757832, 31.282814348), (-41.625380126, 32.907192054))
            Line((-41.625380126, 32.907192054), (-37.236525371, 32.907192054))
            ThreePointArc((-37.236525371, 32.907192054), (-35.612147664, 31.282814348), (-37.236525371, 29.658436642))
        make_face()
    extrude(amount=-CUT_EXTRUDE_10_DEPTH, mode=Mode.SUBTRACT)

    # Ø3.0 (3) 直径孔3
    with Locations(Plane(origin=(0, 0, -5.449868074), x_dir=(-1, 0, 0), z_dir=(0, 0, -1))):
        with Locations((49.466328148, 30.872434524)):
            Hole(HOLE_WIZARD_3_0_3_3_D / 2, depth=HOLE_WIZARD_3_0_3_3_DEPTH)
            with Locations((0, 0, -(HOLE_WIZARD_3_0_3_3_DEPTH + HOLE_WIZARD_3_0_3_3_TIP / 2))):  # 118° drill point
                Cone(0, HOLE_WIZARD_3_0_3_3_D / 2, HOLE_WIZARD_3_0_3_3_TIP, mode=Mode.SUBTRACT)

    # 草图117 → 凸台-拉伸27 (add, symmetric)
    with BuildSketch(Plane(origin=(0, 0, -5.449868074), x_dir=(-1, 0, 0), z_dir=(0, 0, -1))):
        Polygon((56.575646438, 25.972434524), (71.675646438, 26), (71.648263514, 41), (56.548263514, 40.972434524), align=None)
    extrude(amount=EXTRUDE_27_DEPTH, both=True)

    # 圆角2
    fillet_2_edges = [part.edges().sort_by_distance(p)[0] for p in [
        (-34.345646438, 36, -2.449868074),
        (-34.345646438, 25.972434524, -2.449868074),
    ]]
    fillet(fillet_2_edges, radius=FILLET_2_R)

    # 草图120 → 切除-拉伸13 (cut)
    with BuildSketch(Plane.XY.offset(-2.449868074)):
        with BuildLine():
            Line((-48.605927595, 29.341001888), (-51.282166157, 29.341001888))
            ThreePointArc((-51.282166157, 29.341001888), (-52.813598792, 30.872434524), (-51.282166157, 32.403867159))
            Line((-51.282166157, 32.403867159), (-48.605927595, 32.403867159))
            ThreePointArc((-48.605927595, 32.403867159), (-47.074494959, 30.872434524), (-48.605927595, 29.341001888))
        make_face()
    extrude(amount=-CUT_EXTRUDE_13_DEPTH, mode=Mode.SUBTRACT)

    # 草图122 → 凸台-拉伸28 (add)
    with BuildSketch(Plane.XY.offset(-2.449868074)):
        Polygon((-71.648263514, 41), (-71.675646438, 26), (-77.675646438, 26.010953169), (-77.648263514, 41.010953169), align=None)
    extrude(amount=-EXTRUDE_28_DEPTH)

    # 草图123 → 凸台-拉伸29 (add)
    with BuildSketch(Plane(origin=(0, 0, -8.449868074), x_dir=(-1, 0, 0), z_dir=(0, 0, -1))):
        Polygon((77.648263514, 41.010953169), (77.675646438, 26.010953169), (62.675646438, 25.983570246), (62.648263514, 40.983570246), align=None)
    extrude(amount=EXTRUDE_29_DEPTH)

    # 草图125 → 凸台-拉伸30 (add)
    with BuildSketch(Plane.XY.offset(-2.449868074)):
        Polygon((-77.648263514, 41.010953169), (-77.675646438, 26.010953169), (-56.575646438, 25.972434524), (-56.548263514, 40.972434524), align=None)
    extrude(amount=EXTRUDE_30_DEPTH)

    # 草图126 → 切除-拉伸14 (cut)
    with BuildSketch(Plane(origin=(0, 0, -48.449868074), x_dir=(-1, 0, 0), z_dir=(0, 0, -1))):
        with Locations((73.161417861, 33.801070433)):
            Circle(SKETCH_126_R)
    extrude(amount=-CUT_EXTRUDE_14_DEPTH, mode=Mode.SUBTRACT)

    # 圆角3
    fillet_3_edges = [part.edges().sort_by_distance(p)[0] for p in [
        (-77.653492443, 38.146615963, -20.449868074),
    ]]
    fillet(fillet_3_edges, radius=FILLET_3_R)

    # 圆角4
    fillet_4_edges = [part.edges().sort_by_distance(p)[0] for p in [
        (-77.669328282, 29.471954631, -20.449868074),
    ]]
    fillet(fillet_4_edges, radius=FILLET_4_R)


solid = part.part
